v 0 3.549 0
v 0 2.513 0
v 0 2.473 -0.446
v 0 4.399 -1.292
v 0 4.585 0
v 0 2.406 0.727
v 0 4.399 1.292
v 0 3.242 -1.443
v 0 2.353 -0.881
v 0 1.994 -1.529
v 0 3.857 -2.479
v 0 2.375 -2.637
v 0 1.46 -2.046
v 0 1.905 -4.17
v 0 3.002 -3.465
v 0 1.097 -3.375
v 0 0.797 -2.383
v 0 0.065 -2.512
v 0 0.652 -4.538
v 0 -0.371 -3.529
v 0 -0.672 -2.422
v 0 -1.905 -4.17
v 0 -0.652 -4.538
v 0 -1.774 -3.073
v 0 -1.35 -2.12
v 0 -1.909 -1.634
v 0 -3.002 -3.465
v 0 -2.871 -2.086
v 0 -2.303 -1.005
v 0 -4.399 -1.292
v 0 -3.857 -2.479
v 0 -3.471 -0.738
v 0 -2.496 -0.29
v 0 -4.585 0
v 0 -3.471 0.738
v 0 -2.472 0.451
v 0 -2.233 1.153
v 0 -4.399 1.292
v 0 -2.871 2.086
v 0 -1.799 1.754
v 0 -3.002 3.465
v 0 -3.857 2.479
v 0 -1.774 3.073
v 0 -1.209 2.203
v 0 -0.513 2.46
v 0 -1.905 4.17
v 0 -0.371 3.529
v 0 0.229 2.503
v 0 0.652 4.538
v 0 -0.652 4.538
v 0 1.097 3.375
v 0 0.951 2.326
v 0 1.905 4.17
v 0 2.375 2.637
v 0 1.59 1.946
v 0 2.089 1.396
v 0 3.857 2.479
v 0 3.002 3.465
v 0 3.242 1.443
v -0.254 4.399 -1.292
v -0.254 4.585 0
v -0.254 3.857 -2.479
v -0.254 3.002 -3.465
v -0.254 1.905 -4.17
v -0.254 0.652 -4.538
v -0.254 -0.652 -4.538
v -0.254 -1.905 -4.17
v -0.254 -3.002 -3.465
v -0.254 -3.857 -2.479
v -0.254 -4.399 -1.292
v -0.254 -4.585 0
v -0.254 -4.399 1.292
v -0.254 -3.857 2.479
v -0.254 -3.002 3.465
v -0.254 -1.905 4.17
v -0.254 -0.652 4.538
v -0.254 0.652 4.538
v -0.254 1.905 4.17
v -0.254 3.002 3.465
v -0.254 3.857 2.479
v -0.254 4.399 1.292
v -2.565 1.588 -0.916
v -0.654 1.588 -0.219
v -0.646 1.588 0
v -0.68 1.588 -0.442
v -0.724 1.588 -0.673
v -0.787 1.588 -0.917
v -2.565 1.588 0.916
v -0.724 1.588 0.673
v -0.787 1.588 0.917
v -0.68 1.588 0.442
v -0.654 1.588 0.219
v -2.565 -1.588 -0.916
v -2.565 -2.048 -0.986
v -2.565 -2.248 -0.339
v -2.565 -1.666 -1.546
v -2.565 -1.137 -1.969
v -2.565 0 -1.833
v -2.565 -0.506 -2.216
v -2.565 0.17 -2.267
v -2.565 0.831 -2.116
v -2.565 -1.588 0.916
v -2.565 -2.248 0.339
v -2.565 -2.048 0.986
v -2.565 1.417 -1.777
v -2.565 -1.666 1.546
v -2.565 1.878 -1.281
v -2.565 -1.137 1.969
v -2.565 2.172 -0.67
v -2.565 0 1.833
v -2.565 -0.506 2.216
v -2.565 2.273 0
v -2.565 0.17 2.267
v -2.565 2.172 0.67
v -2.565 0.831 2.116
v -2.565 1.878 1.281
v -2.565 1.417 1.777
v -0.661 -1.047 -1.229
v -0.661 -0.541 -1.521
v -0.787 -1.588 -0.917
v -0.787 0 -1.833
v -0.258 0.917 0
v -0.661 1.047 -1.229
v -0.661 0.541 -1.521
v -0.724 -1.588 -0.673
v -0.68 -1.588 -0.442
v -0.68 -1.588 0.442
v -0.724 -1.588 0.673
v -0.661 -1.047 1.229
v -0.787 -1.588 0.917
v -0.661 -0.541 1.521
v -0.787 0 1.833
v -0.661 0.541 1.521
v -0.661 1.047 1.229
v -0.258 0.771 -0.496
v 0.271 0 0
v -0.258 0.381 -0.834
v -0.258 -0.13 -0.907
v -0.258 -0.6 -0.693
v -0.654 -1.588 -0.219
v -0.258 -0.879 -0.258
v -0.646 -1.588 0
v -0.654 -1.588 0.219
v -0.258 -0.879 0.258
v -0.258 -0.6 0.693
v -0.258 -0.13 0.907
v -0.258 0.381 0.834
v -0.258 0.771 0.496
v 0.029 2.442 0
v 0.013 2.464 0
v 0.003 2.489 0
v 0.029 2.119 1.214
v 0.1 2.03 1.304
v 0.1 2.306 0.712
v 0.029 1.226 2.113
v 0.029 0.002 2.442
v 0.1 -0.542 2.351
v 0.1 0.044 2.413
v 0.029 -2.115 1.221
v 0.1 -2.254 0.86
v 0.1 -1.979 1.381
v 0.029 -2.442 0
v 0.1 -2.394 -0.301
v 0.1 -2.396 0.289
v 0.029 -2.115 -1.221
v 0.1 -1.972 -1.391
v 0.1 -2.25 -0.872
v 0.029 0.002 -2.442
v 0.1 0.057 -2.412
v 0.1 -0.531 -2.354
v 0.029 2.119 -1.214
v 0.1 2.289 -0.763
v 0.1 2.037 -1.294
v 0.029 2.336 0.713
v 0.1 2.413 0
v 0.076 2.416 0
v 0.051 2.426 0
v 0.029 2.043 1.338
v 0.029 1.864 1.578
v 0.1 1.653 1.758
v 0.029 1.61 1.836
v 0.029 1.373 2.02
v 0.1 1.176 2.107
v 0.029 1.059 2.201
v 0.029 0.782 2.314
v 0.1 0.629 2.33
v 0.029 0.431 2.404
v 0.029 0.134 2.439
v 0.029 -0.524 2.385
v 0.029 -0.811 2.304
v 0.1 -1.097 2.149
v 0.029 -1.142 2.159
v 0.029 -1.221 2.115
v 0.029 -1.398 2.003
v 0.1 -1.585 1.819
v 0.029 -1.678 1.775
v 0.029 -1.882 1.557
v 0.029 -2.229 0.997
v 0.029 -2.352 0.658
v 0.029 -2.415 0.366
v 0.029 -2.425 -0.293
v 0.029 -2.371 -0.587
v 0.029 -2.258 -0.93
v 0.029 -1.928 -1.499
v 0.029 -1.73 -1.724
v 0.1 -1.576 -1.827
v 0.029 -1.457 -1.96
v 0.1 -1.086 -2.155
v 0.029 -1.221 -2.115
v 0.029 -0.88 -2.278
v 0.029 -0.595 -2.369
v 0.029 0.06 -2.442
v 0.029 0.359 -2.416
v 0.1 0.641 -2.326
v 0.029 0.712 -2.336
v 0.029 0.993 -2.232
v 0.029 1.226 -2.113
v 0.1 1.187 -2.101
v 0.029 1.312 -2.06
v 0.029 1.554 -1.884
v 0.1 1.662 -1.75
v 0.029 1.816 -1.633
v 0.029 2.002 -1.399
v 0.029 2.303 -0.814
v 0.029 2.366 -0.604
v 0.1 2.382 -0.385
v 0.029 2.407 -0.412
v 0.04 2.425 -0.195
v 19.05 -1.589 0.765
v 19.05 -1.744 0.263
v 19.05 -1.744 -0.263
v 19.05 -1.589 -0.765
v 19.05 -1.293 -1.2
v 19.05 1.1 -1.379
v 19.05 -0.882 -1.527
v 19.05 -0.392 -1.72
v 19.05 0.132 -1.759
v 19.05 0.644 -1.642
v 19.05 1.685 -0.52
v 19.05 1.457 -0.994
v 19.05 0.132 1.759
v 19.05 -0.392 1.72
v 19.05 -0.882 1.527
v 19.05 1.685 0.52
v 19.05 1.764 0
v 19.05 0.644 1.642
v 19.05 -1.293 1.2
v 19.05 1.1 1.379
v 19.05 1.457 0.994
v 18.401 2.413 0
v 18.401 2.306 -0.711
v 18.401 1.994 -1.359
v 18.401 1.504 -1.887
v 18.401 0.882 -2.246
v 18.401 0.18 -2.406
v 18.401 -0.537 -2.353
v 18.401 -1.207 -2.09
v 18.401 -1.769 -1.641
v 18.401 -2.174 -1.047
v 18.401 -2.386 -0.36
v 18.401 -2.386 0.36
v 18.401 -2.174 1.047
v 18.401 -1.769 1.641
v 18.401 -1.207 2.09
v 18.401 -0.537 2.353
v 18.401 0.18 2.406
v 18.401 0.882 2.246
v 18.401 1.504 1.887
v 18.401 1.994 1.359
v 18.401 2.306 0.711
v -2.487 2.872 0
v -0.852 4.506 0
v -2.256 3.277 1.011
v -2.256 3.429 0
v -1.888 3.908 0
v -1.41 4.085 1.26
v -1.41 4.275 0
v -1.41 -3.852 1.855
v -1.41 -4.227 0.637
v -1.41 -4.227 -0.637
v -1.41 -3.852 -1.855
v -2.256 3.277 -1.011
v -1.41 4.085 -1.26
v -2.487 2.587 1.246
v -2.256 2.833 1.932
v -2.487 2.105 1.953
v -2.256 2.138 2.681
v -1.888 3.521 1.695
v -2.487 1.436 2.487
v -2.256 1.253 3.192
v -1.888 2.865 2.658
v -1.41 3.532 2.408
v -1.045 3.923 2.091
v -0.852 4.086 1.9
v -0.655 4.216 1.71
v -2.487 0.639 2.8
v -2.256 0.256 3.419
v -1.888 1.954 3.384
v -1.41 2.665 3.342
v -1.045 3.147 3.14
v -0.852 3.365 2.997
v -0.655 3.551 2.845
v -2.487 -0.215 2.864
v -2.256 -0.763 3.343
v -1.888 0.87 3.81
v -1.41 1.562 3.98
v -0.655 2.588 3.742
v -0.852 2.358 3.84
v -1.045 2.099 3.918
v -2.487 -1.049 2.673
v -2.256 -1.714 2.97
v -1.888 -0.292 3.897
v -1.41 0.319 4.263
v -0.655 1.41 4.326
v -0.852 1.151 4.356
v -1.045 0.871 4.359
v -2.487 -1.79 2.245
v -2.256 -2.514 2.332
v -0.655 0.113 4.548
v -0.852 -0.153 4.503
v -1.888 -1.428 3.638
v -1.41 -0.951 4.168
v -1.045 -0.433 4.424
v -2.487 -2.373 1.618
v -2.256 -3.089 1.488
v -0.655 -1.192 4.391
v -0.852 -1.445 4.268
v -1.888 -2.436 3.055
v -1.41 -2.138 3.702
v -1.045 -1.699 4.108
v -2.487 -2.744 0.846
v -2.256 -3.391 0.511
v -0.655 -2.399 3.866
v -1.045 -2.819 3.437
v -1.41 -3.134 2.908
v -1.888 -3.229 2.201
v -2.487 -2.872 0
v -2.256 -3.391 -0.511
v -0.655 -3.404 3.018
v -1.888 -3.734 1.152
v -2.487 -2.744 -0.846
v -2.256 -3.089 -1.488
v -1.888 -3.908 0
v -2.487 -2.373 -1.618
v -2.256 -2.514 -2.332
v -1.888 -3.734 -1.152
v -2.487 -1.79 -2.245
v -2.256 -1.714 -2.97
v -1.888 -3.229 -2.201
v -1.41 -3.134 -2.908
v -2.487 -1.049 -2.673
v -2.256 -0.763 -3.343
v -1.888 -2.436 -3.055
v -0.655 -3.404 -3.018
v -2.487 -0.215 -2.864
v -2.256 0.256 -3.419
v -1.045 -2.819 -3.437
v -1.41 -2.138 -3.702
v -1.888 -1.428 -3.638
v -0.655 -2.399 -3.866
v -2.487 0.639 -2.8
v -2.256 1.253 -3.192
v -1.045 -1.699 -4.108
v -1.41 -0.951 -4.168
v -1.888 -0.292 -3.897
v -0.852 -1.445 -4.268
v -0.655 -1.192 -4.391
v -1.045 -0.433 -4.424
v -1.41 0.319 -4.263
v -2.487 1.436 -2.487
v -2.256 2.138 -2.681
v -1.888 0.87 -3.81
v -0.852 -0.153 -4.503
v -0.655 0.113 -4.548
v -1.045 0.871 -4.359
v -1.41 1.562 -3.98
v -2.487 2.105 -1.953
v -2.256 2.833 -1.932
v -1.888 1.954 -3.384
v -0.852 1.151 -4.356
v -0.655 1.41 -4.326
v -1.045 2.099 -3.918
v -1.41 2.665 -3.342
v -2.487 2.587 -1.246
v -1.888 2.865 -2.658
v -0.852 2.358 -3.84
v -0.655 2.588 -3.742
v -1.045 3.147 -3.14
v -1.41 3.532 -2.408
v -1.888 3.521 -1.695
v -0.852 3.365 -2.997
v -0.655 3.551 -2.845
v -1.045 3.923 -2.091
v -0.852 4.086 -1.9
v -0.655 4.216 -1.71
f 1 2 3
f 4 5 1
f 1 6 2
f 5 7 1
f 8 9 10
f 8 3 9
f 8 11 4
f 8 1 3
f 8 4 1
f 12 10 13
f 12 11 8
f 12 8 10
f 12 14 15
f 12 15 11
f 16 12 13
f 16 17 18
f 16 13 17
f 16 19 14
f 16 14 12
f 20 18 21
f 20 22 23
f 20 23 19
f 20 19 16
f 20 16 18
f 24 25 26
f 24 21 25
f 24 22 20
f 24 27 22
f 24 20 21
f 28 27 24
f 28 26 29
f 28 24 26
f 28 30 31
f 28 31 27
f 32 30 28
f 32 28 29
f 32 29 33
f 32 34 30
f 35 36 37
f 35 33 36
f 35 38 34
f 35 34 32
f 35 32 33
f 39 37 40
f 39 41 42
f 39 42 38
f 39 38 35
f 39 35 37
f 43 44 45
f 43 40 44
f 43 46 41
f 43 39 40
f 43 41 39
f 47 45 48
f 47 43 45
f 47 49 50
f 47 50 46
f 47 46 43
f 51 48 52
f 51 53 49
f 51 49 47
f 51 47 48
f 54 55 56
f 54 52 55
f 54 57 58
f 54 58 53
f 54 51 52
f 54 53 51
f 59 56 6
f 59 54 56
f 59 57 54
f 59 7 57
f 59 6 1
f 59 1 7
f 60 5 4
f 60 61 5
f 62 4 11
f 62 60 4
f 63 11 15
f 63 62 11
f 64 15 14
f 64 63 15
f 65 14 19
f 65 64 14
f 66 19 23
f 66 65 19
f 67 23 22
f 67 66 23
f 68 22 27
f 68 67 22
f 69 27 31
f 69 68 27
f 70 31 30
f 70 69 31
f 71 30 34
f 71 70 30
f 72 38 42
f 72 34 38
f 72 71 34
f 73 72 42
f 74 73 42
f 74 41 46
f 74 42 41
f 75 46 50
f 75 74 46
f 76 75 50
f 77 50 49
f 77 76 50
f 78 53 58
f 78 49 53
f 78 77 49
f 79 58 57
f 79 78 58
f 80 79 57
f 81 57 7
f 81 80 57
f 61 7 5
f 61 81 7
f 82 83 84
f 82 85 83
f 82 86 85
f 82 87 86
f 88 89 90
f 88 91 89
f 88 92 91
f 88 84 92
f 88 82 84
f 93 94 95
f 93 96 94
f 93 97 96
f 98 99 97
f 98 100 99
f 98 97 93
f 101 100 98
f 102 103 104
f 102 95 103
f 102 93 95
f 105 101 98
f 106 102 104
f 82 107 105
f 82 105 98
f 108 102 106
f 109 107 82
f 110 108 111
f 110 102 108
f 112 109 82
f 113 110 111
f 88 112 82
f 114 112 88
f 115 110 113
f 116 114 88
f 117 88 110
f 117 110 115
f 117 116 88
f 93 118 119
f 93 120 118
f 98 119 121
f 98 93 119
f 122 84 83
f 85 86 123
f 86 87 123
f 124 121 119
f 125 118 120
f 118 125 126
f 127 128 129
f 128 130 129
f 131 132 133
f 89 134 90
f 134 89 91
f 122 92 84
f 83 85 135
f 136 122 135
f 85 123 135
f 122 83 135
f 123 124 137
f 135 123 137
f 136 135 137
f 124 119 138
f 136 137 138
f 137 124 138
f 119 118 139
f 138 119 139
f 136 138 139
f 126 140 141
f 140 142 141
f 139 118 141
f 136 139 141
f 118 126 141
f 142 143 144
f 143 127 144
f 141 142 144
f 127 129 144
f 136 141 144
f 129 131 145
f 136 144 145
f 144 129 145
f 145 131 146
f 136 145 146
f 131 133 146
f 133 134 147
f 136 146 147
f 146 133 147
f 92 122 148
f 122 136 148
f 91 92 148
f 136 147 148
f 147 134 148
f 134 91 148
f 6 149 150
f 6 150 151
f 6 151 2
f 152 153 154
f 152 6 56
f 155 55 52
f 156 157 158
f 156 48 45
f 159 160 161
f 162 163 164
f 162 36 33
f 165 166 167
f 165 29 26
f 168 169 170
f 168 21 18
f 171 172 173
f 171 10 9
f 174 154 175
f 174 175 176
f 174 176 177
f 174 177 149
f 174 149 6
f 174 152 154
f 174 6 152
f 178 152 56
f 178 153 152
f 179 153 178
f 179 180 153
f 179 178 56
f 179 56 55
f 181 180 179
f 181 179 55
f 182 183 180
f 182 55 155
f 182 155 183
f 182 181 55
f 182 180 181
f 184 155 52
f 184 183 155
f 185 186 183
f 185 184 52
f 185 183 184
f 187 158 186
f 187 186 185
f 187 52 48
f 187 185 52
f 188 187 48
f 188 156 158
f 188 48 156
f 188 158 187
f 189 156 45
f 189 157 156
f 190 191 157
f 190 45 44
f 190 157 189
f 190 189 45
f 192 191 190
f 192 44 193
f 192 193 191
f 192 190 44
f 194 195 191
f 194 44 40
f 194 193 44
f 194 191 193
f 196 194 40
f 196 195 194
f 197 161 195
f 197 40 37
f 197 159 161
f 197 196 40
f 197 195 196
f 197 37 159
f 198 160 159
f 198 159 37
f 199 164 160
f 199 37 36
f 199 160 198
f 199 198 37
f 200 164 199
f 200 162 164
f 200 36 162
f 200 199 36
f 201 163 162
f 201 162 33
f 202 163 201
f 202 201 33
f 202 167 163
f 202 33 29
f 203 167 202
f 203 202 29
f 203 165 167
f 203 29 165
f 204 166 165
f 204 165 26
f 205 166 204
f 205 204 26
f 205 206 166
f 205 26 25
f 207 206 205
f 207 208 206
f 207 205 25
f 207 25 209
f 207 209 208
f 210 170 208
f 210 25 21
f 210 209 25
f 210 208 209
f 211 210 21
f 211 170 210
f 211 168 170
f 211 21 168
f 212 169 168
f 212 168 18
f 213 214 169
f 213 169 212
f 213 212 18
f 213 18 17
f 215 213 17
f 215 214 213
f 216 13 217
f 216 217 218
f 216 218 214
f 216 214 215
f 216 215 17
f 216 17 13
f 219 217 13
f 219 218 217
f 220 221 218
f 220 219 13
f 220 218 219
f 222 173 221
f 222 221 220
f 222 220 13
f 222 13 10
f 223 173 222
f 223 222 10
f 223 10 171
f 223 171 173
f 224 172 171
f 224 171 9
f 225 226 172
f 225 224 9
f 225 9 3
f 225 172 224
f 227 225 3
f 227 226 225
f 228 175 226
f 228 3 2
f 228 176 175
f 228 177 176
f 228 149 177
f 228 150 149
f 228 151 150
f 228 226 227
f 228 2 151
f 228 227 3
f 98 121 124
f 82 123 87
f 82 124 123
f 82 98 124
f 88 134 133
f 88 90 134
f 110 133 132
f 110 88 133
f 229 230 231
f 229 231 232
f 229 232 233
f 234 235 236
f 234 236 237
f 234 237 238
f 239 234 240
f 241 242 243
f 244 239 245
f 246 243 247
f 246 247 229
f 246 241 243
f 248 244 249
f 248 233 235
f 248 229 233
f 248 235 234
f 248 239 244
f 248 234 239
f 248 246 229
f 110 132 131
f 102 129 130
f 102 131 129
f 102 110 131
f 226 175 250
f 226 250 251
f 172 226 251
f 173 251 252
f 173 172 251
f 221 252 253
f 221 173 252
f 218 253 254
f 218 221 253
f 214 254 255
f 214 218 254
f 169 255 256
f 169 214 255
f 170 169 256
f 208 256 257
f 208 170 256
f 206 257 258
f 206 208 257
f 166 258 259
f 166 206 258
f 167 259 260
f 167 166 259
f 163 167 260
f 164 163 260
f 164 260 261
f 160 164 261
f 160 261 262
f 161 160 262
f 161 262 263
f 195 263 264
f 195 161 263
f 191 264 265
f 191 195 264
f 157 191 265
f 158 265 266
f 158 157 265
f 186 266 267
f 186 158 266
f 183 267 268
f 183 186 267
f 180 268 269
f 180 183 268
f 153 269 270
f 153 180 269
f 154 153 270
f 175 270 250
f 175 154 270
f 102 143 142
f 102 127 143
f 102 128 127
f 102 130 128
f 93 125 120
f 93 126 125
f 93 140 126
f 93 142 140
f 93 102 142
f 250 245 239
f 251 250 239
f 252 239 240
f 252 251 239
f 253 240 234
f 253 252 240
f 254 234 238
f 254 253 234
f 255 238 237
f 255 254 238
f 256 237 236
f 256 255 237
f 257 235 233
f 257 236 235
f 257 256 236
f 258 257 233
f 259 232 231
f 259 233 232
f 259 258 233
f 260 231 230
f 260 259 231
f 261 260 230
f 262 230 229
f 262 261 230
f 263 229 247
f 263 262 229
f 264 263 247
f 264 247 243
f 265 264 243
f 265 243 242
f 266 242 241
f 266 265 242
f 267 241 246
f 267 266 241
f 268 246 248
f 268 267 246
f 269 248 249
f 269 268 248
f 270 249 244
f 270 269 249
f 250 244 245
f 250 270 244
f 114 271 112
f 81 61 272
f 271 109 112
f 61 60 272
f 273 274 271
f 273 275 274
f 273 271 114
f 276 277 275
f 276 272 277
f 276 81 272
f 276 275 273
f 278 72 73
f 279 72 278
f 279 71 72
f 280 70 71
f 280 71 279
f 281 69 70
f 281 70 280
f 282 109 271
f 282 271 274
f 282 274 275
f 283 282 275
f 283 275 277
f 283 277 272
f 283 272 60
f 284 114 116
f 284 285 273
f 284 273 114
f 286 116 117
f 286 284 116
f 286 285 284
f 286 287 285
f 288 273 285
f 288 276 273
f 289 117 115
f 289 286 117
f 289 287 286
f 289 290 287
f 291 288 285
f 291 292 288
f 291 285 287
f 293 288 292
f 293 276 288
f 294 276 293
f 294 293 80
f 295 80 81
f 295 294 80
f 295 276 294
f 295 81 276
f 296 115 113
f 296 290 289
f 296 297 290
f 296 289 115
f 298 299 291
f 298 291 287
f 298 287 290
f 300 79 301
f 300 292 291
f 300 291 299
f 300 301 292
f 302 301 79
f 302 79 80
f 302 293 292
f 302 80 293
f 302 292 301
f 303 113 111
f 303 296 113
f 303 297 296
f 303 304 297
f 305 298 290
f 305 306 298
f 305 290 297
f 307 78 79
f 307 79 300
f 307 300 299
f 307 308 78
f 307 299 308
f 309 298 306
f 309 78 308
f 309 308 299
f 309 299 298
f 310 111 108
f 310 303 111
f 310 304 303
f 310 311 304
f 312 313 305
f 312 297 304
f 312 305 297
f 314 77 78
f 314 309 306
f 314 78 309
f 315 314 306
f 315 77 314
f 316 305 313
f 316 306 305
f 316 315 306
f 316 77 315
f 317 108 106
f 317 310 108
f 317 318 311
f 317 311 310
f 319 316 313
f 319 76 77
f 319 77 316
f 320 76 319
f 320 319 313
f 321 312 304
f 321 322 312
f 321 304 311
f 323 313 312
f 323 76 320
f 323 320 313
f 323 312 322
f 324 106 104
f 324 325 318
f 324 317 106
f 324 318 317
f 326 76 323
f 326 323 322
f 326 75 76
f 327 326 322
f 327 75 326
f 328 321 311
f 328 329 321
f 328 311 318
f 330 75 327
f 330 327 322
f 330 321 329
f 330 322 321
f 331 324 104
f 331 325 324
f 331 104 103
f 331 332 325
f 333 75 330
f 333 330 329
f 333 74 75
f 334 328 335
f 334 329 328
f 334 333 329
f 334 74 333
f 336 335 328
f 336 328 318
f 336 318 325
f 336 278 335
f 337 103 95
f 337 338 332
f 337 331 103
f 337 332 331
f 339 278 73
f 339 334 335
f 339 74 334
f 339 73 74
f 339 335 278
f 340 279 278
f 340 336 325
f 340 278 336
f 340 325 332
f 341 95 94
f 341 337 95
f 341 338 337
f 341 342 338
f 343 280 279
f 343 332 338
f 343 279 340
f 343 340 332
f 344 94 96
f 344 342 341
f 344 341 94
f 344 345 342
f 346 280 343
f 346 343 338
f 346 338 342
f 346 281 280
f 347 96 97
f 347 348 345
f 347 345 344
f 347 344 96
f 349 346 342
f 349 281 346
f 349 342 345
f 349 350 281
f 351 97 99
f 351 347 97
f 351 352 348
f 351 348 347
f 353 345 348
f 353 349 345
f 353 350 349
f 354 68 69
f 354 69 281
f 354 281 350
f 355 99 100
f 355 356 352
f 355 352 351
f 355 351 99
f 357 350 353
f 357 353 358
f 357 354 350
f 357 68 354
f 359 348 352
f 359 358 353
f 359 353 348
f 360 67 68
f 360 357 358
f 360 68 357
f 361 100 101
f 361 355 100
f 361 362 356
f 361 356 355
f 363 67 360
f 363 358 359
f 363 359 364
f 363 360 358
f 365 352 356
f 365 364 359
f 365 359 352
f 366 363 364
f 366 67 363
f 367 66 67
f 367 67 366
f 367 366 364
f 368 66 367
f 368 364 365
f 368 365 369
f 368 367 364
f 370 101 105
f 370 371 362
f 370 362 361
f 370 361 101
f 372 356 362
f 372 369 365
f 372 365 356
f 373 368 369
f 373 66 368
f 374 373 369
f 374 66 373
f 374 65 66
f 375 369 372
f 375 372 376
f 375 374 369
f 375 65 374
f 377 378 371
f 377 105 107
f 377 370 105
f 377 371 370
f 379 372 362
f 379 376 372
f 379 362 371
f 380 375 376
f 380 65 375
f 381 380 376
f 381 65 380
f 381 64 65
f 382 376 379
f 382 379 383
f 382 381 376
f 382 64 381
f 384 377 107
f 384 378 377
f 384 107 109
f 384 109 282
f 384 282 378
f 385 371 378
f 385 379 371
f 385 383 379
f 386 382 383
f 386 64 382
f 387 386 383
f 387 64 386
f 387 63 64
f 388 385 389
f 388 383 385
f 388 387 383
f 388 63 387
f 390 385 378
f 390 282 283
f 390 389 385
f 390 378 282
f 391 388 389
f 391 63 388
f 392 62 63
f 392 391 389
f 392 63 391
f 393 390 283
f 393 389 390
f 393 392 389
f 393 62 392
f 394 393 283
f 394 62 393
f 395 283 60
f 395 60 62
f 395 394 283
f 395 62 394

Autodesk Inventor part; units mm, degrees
ref_plane "YZ Plane" through (0, 0, 0) normal (1, 0, 0) x (0, 1, 0)
ref_plane "XZ Plane" through (0, 0, 0) normal (0, 1, 0) x (-1, 0, 0)
sketch "Sketch1" plane through (0, 0, 0) normal (0, 0, 1) x (1, 0, 0)
  line L0 (0.2709, 0) -> (19.05, 0)
  line L1 (19.05, 0) -> (19.05, 2.413)
  line L2 (19.05, 2.413) -> (2.1084, 2.413)
  line L3 (2.1084, 2.413) -> (0.0001, 2.413)
  line L4 (0.0001, 2.413) -> (0, 2.413)
  line L5 (0, 2.413) -> (0, 4.5847)
  line L6 (0, 4.5847) -> (-2.5654, 4.5847)
  line L7 (-2.5654, 4.5847) -> (-2.5654, 1.8331)
  line L8 (-2.5654, 1.8331) -> (-0.7874, 1.8331)
  line L9 (-0.7874, 1.8331) -> (0.2709, 0)
  line L10 (-6.8885, 0) -> (23.3731, 0) projected
  line L11 (0, -0.9169) -> (0, 5.5016) projected
  line L12 (2.1084, 2.413) -> (0, 2.413) construction
  dimension "d1" = 16.9416
  dimension "d2" = 2.1083
  dimension "d3" = 2.5654
  dimension "d4" = 1.778
  dimension "d5" = 60
  dimension "d6" = 4.826
  dimension "d7" = 4.826
  dimension "d8" = 3.6662
  dimension "d9" = 9.1694
  dimension "d26" = 19.05
revolve "Body" add sketch "Sketch1" angle 360 about axis through (0.2709, 0, 0) along (1, 0, 0) contours L9 L11 L3 L2 L1 L0 | L9 L8 L7 L6 L5 L11
sketch "Sketch2" plane through (-2.5654, 0, 0) normal (-1, 0, 0) x (0, 0, 1)
  circle A0 centre (0, 0) radius 1.8331 projected
  line L0 (0, -6.4186) -> (0, 6.4186) projected
  line L1 (-6.4186, 0) -> (6.4186, 0) projected
  line L2 (1.8331, 0) -> (0.9165, -1.5875)
  line L3 (0.9165, -1.5875) -> (-0.9165, -1.5875)
  line L4 (-0.9165, -1.5875) -> (-1.8331, 0)
  line L5 (-1.8331, 0) -> (-0.9165, 1.5875)
  line L6 (-0.9165, 1.5875) -> (0.9165, 1.5875)
  line L7 (0.9165, 1.5875) -> (1.8331, 0)
  point P0 (0, 0)
extrude "Slot" add sketch "Sketch2" against normal up to next contours L7 A0 | A0 L2 | L6 L0 A0 | A0 L0 L3 | L0 L6 A0 | A0 L3 L0 | L4 A0 | A0 L5
fillet "Fillet1" radius 2.3114 1 edges at (-2.5654, -4.5847, 0)
thread "Thread" size "10-24 UNC" class "2A" standard "ANSI Unified Screw Threads" length 16.9416
chamfer "Chamfer1" distance 0.6492 distance2 0.6492 1 edges at (19.05, -2.413, 0) measured on face at (19.05, -1.2173, -0.6389)
ref_plane "Work Plane1" through (29, 0, 0) normal (0, -1, 0) x (1, 0, 0)
fillet "Fillet2" radius 0.1 1 edges at (0.0001, -2.413, 0)
equation "\"d1\" = GEL"
equation "\"d3\" = KOH"
equation "\"d4\" = INTI"
equation "\"d6\" = GD"
equation "\"d7\" = BDM"
equation "\"d8\" = 1.1547 * SW"
equation "\"d9\" = KOD"
equation "\"d26\" = NLG"
equation "\"d30\" = R"
equation "\"d17\" = RR"
equation "\"d13\" = GEL"
equation "\"d15\" = -0.5 * SPD + 0.5 * GD"
equation "\"d16\" = GUL"
equation "\"GD\" = NND"
equation "\"NLG\" = 19.05"
equation "\"GEL\" = 16.9416"
equation "\"KOD\" = 9.1694"
equation "\"KOH\" = 2.5654"
equation "\"INTI\" = 1.778"
equation "\"GAL\" = 2.1082"
equation "\"GUL\" = 0.64922"
equation "\"BDM\" = NND"
equation "\"SW\" = 3.175"
equation "\"RR\" = 2.3114"
equation "\"SPD\" = 3.52755"
equation "\"R\" = 0.1"
equation "\"TOA\" = 30deg"
equation "\"GD1\" = SPD"
equation "\"THREADDIA\" = 4.826"
equation "\"KOH1\" = 0.508"
equation "\"NND\" = 4.826"
equation "\"E0\" = 3.66725"
properties part number "ANSI B18.3 - 10 - 24 x 3/4" material "Steel, Mild"
